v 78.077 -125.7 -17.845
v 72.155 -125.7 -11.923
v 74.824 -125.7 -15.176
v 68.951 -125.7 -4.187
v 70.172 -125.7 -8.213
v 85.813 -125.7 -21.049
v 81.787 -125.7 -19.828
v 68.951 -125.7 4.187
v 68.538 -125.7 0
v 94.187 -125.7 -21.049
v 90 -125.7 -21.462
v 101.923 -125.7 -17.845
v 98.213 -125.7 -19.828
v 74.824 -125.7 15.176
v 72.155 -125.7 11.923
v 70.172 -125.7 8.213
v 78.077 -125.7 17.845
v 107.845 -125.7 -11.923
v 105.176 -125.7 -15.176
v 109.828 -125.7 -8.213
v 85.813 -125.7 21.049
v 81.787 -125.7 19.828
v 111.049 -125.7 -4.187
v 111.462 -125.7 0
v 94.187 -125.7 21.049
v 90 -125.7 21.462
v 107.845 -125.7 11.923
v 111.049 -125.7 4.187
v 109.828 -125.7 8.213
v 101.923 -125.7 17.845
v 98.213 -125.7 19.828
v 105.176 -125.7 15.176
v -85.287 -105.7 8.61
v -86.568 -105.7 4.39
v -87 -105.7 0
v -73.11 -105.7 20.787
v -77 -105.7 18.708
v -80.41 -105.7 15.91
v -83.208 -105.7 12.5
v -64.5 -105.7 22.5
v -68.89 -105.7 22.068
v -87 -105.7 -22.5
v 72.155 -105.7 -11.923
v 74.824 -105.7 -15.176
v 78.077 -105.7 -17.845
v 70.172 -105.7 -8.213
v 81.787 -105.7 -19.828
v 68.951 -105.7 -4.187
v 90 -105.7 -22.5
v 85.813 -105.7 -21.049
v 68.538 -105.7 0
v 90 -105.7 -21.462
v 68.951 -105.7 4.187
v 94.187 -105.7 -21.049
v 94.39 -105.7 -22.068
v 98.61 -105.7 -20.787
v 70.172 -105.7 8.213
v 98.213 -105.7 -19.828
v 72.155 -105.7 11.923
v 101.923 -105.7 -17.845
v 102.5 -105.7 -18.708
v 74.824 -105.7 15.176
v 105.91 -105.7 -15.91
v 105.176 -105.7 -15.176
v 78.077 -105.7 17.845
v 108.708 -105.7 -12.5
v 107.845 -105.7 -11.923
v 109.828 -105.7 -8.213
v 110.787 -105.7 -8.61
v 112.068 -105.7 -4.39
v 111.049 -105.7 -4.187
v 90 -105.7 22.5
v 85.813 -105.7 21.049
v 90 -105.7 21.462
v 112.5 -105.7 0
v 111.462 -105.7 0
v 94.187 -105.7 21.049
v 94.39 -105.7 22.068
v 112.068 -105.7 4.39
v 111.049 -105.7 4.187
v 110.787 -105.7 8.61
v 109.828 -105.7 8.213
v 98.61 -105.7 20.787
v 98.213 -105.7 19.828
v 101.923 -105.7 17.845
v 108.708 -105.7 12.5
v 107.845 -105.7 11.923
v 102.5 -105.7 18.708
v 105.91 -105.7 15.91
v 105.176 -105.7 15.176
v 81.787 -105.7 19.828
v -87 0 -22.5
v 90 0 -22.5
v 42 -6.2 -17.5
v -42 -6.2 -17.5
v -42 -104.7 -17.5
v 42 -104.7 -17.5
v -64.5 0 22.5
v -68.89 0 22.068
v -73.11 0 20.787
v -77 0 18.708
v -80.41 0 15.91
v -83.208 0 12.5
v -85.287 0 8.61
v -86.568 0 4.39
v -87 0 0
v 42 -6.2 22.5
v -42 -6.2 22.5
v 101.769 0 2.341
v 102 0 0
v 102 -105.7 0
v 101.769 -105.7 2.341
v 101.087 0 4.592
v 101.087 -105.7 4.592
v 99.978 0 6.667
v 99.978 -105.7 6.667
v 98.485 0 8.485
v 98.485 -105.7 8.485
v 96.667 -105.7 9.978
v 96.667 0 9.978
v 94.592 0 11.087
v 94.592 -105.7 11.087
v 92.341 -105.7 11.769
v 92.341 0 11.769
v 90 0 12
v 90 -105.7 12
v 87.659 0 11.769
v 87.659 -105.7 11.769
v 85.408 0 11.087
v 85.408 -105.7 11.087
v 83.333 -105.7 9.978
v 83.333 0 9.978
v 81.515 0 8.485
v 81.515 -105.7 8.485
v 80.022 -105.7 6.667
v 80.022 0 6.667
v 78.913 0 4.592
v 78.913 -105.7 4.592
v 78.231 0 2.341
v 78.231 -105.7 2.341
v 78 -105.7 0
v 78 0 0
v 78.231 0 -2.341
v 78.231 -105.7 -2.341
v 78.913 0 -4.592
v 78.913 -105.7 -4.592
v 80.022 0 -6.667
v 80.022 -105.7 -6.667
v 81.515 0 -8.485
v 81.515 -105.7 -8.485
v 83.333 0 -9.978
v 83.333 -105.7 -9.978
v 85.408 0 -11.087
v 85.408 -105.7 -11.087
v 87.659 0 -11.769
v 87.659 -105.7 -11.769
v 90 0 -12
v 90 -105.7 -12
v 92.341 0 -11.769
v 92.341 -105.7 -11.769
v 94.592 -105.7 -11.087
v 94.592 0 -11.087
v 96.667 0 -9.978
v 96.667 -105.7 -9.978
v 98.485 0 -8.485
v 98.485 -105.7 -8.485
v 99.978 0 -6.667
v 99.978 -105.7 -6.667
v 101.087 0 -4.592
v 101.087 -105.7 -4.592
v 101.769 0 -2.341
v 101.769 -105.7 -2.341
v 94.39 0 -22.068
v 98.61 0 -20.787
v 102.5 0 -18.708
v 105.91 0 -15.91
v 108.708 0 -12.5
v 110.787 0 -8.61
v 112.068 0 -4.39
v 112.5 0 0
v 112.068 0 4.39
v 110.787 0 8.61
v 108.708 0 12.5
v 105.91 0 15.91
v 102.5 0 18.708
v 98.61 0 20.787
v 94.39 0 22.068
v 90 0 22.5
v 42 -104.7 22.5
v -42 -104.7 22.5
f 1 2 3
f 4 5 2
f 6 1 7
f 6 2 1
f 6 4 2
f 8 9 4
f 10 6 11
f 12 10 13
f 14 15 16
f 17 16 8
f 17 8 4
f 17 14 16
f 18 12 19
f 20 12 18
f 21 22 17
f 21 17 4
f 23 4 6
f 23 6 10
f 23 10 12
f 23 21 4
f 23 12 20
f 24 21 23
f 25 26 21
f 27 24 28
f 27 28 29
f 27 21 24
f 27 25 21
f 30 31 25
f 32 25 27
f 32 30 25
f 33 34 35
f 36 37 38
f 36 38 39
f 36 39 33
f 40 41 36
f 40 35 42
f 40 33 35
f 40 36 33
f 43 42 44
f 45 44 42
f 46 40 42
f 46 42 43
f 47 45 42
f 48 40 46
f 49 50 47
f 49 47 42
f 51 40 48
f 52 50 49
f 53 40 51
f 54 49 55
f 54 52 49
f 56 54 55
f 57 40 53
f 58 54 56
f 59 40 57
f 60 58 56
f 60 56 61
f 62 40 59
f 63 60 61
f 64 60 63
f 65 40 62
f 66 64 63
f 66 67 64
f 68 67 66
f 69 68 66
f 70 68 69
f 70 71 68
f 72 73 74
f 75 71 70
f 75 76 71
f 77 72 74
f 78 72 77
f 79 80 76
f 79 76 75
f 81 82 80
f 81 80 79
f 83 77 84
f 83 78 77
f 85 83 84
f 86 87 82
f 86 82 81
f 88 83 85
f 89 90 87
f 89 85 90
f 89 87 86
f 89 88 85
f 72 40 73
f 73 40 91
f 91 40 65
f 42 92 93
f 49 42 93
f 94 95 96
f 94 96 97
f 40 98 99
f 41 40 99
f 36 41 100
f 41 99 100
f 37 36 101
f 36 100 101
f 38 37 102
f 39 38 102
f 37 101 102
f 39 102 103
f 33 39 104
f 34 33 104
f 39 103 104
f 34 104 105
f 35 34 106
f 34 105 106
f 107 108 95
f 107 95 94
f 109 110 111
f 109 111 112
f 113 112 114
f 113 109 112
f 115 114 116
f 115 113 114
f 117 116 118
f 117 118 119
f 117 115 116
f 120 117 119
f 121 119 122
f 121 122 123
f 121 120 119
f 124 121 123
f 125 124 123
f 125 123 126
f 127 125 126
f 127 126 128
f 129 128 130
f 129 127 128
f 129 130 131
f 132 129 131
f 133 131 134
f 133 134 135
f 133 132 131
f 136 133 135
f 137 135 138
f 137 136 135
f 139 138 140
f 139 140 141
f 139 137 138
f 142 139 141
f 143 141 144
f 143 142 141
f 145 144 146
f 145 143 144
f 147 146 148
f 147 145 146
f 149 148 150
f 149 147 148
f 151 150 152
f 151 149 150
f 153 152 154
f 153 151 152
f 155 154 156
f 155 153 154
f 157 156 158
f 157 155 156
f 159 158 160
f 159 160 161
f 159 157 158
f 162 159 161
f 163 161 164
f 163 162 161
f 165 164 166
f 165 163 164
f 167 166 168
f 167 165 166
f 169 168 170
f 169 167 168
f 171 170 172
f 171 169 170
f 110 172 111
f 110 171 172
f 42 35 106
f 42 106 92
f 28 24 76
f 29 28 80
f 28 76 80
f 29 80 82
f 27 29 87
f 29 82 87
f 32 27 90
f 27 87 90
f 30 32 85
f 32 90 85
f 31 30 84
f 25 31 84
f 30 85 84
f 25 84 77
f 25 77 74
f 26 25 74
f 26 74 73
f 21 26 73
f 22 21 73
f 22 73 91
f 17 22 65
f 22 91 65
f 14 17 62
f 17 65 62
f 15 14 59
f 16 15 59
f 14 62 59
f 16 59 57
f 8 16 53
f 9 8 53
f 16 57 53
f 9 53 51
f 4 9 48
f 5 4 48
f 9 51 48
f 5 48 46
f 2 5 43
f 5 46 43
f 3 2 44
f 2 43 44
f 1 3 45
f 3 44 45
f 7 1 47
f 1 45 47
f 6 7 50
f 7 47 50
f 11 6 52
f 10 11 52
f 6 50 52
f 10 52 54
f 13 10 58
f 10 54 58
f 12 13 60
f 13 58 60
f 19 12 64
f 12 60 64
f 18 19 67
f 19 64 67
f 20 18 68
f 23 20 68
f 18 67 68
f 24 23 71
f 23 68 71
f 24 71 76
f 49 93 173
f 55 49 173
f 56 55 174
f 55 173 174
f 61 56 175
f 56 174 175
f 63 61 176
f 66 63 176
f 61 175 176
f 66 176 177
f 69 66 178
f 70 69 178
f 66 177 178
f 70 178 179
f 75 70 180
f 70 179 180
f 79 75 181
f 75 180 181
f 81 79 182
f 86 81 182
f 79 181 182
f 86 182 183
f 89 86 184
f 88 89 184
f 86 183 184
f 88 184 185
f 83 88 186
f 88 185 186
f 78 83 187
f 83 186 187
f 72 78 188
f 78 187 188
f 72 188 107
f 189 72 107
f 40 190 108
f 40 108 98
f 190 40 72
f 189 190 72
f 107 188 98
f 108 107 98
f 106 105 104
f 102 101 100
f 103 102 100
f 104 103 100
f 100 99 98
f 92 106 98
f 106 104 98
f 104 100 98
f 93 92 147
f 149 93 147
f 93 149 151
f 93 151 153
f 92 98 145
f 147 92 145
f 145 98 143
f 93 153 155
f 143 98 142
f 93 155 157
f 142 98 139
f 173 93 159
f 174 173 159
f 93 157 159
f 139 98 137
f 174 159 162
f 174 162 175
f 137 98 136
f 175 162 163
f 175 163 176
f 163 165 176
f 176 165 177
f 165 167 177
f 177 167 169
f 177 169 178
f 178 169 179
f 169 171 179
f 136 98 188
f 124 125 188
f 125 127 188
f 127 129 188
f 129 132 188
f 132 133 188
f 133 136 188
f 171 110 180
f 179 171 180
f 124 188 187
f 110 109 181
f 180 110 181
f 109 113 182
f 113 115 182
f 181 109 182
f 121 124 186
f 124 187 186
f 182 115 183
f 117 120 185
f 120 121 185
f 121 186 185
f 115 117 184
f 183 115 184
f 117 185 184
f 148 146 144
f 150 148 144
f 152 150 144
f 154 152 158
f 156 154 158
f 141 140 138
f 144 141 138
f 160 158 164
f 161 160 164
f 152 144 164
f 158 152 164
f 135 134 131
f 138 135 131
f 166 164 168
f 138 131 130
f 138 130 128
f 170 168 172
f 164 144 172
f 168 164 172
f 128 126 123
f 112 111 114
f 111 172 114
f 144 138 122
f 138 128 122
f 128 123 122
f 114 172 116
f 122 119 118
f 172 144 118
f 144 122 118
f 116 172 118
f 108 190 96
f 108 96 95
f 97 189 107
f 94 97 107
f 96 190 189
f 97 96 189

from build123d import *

# Parameters (mm, degrees)
F0_R     = 12
F1_DEPTH = 105.7
F3_DEPTH = 105.7
F4_W     = 84
F4_H     = 98.5
F5_DEPTH = 40
F6_R     = 21.461704
F7_DEPTH = 20


with BuildPart() as f1:
    # F0 (on Front) → F1 (new body)
    with BuildSketch(Plane.XZ):
        with BuildLine():
            Line((90, 22.5), (0, 22.5))
            Line((0, 22.5), (-64.5, 22.5))
            ThreePointArc((-64.5, 22.5), (-87, 0), (-64.5, -22.5))
            Line((-64.5, -22.5), (0, -22.5))
            Line((0, -22.5), (90, -22.5))
            ThreePointArc((90, -22.5), (112.5, 0), (90, 22.5))
        make_face()
        with Locations((90, 0)):
            Circle(F0_R, mode=Mode.SUBTRACT)
    extrude(amount=F1_DEPTH)

    # F2 (on face) → F3 (join)
    with BuildSketch(Plane.XZ.offset(105.7)):
        Polygon((-84.272794, -1.934636), (-87, 0), (-87, -22.5), (-64.5, -22.5), (-70.418127, -18.801184), (-80.156557, -10.970287), align=None)
    extrude(amount=-F3_DEPTH)

    # F4 (on face) → F5 (cut)
    with BuildSketch(Plane.XY.offset(22.5)):
        with Locations((0, -55.45)):
            Rectangle(F4_W, F4_H)
    extrude(amount=-F5_DEPTH, mode=Mode.SUBTRACT)

    # F6 (on face) → F7 (join)
    with BuildSketch(Plane.XZ.offset(105.7)):
        with Locations((90, 0)):
            Circle(F6_R)
    extrude(amount=F7_DEPTH)


solid = f1.part
